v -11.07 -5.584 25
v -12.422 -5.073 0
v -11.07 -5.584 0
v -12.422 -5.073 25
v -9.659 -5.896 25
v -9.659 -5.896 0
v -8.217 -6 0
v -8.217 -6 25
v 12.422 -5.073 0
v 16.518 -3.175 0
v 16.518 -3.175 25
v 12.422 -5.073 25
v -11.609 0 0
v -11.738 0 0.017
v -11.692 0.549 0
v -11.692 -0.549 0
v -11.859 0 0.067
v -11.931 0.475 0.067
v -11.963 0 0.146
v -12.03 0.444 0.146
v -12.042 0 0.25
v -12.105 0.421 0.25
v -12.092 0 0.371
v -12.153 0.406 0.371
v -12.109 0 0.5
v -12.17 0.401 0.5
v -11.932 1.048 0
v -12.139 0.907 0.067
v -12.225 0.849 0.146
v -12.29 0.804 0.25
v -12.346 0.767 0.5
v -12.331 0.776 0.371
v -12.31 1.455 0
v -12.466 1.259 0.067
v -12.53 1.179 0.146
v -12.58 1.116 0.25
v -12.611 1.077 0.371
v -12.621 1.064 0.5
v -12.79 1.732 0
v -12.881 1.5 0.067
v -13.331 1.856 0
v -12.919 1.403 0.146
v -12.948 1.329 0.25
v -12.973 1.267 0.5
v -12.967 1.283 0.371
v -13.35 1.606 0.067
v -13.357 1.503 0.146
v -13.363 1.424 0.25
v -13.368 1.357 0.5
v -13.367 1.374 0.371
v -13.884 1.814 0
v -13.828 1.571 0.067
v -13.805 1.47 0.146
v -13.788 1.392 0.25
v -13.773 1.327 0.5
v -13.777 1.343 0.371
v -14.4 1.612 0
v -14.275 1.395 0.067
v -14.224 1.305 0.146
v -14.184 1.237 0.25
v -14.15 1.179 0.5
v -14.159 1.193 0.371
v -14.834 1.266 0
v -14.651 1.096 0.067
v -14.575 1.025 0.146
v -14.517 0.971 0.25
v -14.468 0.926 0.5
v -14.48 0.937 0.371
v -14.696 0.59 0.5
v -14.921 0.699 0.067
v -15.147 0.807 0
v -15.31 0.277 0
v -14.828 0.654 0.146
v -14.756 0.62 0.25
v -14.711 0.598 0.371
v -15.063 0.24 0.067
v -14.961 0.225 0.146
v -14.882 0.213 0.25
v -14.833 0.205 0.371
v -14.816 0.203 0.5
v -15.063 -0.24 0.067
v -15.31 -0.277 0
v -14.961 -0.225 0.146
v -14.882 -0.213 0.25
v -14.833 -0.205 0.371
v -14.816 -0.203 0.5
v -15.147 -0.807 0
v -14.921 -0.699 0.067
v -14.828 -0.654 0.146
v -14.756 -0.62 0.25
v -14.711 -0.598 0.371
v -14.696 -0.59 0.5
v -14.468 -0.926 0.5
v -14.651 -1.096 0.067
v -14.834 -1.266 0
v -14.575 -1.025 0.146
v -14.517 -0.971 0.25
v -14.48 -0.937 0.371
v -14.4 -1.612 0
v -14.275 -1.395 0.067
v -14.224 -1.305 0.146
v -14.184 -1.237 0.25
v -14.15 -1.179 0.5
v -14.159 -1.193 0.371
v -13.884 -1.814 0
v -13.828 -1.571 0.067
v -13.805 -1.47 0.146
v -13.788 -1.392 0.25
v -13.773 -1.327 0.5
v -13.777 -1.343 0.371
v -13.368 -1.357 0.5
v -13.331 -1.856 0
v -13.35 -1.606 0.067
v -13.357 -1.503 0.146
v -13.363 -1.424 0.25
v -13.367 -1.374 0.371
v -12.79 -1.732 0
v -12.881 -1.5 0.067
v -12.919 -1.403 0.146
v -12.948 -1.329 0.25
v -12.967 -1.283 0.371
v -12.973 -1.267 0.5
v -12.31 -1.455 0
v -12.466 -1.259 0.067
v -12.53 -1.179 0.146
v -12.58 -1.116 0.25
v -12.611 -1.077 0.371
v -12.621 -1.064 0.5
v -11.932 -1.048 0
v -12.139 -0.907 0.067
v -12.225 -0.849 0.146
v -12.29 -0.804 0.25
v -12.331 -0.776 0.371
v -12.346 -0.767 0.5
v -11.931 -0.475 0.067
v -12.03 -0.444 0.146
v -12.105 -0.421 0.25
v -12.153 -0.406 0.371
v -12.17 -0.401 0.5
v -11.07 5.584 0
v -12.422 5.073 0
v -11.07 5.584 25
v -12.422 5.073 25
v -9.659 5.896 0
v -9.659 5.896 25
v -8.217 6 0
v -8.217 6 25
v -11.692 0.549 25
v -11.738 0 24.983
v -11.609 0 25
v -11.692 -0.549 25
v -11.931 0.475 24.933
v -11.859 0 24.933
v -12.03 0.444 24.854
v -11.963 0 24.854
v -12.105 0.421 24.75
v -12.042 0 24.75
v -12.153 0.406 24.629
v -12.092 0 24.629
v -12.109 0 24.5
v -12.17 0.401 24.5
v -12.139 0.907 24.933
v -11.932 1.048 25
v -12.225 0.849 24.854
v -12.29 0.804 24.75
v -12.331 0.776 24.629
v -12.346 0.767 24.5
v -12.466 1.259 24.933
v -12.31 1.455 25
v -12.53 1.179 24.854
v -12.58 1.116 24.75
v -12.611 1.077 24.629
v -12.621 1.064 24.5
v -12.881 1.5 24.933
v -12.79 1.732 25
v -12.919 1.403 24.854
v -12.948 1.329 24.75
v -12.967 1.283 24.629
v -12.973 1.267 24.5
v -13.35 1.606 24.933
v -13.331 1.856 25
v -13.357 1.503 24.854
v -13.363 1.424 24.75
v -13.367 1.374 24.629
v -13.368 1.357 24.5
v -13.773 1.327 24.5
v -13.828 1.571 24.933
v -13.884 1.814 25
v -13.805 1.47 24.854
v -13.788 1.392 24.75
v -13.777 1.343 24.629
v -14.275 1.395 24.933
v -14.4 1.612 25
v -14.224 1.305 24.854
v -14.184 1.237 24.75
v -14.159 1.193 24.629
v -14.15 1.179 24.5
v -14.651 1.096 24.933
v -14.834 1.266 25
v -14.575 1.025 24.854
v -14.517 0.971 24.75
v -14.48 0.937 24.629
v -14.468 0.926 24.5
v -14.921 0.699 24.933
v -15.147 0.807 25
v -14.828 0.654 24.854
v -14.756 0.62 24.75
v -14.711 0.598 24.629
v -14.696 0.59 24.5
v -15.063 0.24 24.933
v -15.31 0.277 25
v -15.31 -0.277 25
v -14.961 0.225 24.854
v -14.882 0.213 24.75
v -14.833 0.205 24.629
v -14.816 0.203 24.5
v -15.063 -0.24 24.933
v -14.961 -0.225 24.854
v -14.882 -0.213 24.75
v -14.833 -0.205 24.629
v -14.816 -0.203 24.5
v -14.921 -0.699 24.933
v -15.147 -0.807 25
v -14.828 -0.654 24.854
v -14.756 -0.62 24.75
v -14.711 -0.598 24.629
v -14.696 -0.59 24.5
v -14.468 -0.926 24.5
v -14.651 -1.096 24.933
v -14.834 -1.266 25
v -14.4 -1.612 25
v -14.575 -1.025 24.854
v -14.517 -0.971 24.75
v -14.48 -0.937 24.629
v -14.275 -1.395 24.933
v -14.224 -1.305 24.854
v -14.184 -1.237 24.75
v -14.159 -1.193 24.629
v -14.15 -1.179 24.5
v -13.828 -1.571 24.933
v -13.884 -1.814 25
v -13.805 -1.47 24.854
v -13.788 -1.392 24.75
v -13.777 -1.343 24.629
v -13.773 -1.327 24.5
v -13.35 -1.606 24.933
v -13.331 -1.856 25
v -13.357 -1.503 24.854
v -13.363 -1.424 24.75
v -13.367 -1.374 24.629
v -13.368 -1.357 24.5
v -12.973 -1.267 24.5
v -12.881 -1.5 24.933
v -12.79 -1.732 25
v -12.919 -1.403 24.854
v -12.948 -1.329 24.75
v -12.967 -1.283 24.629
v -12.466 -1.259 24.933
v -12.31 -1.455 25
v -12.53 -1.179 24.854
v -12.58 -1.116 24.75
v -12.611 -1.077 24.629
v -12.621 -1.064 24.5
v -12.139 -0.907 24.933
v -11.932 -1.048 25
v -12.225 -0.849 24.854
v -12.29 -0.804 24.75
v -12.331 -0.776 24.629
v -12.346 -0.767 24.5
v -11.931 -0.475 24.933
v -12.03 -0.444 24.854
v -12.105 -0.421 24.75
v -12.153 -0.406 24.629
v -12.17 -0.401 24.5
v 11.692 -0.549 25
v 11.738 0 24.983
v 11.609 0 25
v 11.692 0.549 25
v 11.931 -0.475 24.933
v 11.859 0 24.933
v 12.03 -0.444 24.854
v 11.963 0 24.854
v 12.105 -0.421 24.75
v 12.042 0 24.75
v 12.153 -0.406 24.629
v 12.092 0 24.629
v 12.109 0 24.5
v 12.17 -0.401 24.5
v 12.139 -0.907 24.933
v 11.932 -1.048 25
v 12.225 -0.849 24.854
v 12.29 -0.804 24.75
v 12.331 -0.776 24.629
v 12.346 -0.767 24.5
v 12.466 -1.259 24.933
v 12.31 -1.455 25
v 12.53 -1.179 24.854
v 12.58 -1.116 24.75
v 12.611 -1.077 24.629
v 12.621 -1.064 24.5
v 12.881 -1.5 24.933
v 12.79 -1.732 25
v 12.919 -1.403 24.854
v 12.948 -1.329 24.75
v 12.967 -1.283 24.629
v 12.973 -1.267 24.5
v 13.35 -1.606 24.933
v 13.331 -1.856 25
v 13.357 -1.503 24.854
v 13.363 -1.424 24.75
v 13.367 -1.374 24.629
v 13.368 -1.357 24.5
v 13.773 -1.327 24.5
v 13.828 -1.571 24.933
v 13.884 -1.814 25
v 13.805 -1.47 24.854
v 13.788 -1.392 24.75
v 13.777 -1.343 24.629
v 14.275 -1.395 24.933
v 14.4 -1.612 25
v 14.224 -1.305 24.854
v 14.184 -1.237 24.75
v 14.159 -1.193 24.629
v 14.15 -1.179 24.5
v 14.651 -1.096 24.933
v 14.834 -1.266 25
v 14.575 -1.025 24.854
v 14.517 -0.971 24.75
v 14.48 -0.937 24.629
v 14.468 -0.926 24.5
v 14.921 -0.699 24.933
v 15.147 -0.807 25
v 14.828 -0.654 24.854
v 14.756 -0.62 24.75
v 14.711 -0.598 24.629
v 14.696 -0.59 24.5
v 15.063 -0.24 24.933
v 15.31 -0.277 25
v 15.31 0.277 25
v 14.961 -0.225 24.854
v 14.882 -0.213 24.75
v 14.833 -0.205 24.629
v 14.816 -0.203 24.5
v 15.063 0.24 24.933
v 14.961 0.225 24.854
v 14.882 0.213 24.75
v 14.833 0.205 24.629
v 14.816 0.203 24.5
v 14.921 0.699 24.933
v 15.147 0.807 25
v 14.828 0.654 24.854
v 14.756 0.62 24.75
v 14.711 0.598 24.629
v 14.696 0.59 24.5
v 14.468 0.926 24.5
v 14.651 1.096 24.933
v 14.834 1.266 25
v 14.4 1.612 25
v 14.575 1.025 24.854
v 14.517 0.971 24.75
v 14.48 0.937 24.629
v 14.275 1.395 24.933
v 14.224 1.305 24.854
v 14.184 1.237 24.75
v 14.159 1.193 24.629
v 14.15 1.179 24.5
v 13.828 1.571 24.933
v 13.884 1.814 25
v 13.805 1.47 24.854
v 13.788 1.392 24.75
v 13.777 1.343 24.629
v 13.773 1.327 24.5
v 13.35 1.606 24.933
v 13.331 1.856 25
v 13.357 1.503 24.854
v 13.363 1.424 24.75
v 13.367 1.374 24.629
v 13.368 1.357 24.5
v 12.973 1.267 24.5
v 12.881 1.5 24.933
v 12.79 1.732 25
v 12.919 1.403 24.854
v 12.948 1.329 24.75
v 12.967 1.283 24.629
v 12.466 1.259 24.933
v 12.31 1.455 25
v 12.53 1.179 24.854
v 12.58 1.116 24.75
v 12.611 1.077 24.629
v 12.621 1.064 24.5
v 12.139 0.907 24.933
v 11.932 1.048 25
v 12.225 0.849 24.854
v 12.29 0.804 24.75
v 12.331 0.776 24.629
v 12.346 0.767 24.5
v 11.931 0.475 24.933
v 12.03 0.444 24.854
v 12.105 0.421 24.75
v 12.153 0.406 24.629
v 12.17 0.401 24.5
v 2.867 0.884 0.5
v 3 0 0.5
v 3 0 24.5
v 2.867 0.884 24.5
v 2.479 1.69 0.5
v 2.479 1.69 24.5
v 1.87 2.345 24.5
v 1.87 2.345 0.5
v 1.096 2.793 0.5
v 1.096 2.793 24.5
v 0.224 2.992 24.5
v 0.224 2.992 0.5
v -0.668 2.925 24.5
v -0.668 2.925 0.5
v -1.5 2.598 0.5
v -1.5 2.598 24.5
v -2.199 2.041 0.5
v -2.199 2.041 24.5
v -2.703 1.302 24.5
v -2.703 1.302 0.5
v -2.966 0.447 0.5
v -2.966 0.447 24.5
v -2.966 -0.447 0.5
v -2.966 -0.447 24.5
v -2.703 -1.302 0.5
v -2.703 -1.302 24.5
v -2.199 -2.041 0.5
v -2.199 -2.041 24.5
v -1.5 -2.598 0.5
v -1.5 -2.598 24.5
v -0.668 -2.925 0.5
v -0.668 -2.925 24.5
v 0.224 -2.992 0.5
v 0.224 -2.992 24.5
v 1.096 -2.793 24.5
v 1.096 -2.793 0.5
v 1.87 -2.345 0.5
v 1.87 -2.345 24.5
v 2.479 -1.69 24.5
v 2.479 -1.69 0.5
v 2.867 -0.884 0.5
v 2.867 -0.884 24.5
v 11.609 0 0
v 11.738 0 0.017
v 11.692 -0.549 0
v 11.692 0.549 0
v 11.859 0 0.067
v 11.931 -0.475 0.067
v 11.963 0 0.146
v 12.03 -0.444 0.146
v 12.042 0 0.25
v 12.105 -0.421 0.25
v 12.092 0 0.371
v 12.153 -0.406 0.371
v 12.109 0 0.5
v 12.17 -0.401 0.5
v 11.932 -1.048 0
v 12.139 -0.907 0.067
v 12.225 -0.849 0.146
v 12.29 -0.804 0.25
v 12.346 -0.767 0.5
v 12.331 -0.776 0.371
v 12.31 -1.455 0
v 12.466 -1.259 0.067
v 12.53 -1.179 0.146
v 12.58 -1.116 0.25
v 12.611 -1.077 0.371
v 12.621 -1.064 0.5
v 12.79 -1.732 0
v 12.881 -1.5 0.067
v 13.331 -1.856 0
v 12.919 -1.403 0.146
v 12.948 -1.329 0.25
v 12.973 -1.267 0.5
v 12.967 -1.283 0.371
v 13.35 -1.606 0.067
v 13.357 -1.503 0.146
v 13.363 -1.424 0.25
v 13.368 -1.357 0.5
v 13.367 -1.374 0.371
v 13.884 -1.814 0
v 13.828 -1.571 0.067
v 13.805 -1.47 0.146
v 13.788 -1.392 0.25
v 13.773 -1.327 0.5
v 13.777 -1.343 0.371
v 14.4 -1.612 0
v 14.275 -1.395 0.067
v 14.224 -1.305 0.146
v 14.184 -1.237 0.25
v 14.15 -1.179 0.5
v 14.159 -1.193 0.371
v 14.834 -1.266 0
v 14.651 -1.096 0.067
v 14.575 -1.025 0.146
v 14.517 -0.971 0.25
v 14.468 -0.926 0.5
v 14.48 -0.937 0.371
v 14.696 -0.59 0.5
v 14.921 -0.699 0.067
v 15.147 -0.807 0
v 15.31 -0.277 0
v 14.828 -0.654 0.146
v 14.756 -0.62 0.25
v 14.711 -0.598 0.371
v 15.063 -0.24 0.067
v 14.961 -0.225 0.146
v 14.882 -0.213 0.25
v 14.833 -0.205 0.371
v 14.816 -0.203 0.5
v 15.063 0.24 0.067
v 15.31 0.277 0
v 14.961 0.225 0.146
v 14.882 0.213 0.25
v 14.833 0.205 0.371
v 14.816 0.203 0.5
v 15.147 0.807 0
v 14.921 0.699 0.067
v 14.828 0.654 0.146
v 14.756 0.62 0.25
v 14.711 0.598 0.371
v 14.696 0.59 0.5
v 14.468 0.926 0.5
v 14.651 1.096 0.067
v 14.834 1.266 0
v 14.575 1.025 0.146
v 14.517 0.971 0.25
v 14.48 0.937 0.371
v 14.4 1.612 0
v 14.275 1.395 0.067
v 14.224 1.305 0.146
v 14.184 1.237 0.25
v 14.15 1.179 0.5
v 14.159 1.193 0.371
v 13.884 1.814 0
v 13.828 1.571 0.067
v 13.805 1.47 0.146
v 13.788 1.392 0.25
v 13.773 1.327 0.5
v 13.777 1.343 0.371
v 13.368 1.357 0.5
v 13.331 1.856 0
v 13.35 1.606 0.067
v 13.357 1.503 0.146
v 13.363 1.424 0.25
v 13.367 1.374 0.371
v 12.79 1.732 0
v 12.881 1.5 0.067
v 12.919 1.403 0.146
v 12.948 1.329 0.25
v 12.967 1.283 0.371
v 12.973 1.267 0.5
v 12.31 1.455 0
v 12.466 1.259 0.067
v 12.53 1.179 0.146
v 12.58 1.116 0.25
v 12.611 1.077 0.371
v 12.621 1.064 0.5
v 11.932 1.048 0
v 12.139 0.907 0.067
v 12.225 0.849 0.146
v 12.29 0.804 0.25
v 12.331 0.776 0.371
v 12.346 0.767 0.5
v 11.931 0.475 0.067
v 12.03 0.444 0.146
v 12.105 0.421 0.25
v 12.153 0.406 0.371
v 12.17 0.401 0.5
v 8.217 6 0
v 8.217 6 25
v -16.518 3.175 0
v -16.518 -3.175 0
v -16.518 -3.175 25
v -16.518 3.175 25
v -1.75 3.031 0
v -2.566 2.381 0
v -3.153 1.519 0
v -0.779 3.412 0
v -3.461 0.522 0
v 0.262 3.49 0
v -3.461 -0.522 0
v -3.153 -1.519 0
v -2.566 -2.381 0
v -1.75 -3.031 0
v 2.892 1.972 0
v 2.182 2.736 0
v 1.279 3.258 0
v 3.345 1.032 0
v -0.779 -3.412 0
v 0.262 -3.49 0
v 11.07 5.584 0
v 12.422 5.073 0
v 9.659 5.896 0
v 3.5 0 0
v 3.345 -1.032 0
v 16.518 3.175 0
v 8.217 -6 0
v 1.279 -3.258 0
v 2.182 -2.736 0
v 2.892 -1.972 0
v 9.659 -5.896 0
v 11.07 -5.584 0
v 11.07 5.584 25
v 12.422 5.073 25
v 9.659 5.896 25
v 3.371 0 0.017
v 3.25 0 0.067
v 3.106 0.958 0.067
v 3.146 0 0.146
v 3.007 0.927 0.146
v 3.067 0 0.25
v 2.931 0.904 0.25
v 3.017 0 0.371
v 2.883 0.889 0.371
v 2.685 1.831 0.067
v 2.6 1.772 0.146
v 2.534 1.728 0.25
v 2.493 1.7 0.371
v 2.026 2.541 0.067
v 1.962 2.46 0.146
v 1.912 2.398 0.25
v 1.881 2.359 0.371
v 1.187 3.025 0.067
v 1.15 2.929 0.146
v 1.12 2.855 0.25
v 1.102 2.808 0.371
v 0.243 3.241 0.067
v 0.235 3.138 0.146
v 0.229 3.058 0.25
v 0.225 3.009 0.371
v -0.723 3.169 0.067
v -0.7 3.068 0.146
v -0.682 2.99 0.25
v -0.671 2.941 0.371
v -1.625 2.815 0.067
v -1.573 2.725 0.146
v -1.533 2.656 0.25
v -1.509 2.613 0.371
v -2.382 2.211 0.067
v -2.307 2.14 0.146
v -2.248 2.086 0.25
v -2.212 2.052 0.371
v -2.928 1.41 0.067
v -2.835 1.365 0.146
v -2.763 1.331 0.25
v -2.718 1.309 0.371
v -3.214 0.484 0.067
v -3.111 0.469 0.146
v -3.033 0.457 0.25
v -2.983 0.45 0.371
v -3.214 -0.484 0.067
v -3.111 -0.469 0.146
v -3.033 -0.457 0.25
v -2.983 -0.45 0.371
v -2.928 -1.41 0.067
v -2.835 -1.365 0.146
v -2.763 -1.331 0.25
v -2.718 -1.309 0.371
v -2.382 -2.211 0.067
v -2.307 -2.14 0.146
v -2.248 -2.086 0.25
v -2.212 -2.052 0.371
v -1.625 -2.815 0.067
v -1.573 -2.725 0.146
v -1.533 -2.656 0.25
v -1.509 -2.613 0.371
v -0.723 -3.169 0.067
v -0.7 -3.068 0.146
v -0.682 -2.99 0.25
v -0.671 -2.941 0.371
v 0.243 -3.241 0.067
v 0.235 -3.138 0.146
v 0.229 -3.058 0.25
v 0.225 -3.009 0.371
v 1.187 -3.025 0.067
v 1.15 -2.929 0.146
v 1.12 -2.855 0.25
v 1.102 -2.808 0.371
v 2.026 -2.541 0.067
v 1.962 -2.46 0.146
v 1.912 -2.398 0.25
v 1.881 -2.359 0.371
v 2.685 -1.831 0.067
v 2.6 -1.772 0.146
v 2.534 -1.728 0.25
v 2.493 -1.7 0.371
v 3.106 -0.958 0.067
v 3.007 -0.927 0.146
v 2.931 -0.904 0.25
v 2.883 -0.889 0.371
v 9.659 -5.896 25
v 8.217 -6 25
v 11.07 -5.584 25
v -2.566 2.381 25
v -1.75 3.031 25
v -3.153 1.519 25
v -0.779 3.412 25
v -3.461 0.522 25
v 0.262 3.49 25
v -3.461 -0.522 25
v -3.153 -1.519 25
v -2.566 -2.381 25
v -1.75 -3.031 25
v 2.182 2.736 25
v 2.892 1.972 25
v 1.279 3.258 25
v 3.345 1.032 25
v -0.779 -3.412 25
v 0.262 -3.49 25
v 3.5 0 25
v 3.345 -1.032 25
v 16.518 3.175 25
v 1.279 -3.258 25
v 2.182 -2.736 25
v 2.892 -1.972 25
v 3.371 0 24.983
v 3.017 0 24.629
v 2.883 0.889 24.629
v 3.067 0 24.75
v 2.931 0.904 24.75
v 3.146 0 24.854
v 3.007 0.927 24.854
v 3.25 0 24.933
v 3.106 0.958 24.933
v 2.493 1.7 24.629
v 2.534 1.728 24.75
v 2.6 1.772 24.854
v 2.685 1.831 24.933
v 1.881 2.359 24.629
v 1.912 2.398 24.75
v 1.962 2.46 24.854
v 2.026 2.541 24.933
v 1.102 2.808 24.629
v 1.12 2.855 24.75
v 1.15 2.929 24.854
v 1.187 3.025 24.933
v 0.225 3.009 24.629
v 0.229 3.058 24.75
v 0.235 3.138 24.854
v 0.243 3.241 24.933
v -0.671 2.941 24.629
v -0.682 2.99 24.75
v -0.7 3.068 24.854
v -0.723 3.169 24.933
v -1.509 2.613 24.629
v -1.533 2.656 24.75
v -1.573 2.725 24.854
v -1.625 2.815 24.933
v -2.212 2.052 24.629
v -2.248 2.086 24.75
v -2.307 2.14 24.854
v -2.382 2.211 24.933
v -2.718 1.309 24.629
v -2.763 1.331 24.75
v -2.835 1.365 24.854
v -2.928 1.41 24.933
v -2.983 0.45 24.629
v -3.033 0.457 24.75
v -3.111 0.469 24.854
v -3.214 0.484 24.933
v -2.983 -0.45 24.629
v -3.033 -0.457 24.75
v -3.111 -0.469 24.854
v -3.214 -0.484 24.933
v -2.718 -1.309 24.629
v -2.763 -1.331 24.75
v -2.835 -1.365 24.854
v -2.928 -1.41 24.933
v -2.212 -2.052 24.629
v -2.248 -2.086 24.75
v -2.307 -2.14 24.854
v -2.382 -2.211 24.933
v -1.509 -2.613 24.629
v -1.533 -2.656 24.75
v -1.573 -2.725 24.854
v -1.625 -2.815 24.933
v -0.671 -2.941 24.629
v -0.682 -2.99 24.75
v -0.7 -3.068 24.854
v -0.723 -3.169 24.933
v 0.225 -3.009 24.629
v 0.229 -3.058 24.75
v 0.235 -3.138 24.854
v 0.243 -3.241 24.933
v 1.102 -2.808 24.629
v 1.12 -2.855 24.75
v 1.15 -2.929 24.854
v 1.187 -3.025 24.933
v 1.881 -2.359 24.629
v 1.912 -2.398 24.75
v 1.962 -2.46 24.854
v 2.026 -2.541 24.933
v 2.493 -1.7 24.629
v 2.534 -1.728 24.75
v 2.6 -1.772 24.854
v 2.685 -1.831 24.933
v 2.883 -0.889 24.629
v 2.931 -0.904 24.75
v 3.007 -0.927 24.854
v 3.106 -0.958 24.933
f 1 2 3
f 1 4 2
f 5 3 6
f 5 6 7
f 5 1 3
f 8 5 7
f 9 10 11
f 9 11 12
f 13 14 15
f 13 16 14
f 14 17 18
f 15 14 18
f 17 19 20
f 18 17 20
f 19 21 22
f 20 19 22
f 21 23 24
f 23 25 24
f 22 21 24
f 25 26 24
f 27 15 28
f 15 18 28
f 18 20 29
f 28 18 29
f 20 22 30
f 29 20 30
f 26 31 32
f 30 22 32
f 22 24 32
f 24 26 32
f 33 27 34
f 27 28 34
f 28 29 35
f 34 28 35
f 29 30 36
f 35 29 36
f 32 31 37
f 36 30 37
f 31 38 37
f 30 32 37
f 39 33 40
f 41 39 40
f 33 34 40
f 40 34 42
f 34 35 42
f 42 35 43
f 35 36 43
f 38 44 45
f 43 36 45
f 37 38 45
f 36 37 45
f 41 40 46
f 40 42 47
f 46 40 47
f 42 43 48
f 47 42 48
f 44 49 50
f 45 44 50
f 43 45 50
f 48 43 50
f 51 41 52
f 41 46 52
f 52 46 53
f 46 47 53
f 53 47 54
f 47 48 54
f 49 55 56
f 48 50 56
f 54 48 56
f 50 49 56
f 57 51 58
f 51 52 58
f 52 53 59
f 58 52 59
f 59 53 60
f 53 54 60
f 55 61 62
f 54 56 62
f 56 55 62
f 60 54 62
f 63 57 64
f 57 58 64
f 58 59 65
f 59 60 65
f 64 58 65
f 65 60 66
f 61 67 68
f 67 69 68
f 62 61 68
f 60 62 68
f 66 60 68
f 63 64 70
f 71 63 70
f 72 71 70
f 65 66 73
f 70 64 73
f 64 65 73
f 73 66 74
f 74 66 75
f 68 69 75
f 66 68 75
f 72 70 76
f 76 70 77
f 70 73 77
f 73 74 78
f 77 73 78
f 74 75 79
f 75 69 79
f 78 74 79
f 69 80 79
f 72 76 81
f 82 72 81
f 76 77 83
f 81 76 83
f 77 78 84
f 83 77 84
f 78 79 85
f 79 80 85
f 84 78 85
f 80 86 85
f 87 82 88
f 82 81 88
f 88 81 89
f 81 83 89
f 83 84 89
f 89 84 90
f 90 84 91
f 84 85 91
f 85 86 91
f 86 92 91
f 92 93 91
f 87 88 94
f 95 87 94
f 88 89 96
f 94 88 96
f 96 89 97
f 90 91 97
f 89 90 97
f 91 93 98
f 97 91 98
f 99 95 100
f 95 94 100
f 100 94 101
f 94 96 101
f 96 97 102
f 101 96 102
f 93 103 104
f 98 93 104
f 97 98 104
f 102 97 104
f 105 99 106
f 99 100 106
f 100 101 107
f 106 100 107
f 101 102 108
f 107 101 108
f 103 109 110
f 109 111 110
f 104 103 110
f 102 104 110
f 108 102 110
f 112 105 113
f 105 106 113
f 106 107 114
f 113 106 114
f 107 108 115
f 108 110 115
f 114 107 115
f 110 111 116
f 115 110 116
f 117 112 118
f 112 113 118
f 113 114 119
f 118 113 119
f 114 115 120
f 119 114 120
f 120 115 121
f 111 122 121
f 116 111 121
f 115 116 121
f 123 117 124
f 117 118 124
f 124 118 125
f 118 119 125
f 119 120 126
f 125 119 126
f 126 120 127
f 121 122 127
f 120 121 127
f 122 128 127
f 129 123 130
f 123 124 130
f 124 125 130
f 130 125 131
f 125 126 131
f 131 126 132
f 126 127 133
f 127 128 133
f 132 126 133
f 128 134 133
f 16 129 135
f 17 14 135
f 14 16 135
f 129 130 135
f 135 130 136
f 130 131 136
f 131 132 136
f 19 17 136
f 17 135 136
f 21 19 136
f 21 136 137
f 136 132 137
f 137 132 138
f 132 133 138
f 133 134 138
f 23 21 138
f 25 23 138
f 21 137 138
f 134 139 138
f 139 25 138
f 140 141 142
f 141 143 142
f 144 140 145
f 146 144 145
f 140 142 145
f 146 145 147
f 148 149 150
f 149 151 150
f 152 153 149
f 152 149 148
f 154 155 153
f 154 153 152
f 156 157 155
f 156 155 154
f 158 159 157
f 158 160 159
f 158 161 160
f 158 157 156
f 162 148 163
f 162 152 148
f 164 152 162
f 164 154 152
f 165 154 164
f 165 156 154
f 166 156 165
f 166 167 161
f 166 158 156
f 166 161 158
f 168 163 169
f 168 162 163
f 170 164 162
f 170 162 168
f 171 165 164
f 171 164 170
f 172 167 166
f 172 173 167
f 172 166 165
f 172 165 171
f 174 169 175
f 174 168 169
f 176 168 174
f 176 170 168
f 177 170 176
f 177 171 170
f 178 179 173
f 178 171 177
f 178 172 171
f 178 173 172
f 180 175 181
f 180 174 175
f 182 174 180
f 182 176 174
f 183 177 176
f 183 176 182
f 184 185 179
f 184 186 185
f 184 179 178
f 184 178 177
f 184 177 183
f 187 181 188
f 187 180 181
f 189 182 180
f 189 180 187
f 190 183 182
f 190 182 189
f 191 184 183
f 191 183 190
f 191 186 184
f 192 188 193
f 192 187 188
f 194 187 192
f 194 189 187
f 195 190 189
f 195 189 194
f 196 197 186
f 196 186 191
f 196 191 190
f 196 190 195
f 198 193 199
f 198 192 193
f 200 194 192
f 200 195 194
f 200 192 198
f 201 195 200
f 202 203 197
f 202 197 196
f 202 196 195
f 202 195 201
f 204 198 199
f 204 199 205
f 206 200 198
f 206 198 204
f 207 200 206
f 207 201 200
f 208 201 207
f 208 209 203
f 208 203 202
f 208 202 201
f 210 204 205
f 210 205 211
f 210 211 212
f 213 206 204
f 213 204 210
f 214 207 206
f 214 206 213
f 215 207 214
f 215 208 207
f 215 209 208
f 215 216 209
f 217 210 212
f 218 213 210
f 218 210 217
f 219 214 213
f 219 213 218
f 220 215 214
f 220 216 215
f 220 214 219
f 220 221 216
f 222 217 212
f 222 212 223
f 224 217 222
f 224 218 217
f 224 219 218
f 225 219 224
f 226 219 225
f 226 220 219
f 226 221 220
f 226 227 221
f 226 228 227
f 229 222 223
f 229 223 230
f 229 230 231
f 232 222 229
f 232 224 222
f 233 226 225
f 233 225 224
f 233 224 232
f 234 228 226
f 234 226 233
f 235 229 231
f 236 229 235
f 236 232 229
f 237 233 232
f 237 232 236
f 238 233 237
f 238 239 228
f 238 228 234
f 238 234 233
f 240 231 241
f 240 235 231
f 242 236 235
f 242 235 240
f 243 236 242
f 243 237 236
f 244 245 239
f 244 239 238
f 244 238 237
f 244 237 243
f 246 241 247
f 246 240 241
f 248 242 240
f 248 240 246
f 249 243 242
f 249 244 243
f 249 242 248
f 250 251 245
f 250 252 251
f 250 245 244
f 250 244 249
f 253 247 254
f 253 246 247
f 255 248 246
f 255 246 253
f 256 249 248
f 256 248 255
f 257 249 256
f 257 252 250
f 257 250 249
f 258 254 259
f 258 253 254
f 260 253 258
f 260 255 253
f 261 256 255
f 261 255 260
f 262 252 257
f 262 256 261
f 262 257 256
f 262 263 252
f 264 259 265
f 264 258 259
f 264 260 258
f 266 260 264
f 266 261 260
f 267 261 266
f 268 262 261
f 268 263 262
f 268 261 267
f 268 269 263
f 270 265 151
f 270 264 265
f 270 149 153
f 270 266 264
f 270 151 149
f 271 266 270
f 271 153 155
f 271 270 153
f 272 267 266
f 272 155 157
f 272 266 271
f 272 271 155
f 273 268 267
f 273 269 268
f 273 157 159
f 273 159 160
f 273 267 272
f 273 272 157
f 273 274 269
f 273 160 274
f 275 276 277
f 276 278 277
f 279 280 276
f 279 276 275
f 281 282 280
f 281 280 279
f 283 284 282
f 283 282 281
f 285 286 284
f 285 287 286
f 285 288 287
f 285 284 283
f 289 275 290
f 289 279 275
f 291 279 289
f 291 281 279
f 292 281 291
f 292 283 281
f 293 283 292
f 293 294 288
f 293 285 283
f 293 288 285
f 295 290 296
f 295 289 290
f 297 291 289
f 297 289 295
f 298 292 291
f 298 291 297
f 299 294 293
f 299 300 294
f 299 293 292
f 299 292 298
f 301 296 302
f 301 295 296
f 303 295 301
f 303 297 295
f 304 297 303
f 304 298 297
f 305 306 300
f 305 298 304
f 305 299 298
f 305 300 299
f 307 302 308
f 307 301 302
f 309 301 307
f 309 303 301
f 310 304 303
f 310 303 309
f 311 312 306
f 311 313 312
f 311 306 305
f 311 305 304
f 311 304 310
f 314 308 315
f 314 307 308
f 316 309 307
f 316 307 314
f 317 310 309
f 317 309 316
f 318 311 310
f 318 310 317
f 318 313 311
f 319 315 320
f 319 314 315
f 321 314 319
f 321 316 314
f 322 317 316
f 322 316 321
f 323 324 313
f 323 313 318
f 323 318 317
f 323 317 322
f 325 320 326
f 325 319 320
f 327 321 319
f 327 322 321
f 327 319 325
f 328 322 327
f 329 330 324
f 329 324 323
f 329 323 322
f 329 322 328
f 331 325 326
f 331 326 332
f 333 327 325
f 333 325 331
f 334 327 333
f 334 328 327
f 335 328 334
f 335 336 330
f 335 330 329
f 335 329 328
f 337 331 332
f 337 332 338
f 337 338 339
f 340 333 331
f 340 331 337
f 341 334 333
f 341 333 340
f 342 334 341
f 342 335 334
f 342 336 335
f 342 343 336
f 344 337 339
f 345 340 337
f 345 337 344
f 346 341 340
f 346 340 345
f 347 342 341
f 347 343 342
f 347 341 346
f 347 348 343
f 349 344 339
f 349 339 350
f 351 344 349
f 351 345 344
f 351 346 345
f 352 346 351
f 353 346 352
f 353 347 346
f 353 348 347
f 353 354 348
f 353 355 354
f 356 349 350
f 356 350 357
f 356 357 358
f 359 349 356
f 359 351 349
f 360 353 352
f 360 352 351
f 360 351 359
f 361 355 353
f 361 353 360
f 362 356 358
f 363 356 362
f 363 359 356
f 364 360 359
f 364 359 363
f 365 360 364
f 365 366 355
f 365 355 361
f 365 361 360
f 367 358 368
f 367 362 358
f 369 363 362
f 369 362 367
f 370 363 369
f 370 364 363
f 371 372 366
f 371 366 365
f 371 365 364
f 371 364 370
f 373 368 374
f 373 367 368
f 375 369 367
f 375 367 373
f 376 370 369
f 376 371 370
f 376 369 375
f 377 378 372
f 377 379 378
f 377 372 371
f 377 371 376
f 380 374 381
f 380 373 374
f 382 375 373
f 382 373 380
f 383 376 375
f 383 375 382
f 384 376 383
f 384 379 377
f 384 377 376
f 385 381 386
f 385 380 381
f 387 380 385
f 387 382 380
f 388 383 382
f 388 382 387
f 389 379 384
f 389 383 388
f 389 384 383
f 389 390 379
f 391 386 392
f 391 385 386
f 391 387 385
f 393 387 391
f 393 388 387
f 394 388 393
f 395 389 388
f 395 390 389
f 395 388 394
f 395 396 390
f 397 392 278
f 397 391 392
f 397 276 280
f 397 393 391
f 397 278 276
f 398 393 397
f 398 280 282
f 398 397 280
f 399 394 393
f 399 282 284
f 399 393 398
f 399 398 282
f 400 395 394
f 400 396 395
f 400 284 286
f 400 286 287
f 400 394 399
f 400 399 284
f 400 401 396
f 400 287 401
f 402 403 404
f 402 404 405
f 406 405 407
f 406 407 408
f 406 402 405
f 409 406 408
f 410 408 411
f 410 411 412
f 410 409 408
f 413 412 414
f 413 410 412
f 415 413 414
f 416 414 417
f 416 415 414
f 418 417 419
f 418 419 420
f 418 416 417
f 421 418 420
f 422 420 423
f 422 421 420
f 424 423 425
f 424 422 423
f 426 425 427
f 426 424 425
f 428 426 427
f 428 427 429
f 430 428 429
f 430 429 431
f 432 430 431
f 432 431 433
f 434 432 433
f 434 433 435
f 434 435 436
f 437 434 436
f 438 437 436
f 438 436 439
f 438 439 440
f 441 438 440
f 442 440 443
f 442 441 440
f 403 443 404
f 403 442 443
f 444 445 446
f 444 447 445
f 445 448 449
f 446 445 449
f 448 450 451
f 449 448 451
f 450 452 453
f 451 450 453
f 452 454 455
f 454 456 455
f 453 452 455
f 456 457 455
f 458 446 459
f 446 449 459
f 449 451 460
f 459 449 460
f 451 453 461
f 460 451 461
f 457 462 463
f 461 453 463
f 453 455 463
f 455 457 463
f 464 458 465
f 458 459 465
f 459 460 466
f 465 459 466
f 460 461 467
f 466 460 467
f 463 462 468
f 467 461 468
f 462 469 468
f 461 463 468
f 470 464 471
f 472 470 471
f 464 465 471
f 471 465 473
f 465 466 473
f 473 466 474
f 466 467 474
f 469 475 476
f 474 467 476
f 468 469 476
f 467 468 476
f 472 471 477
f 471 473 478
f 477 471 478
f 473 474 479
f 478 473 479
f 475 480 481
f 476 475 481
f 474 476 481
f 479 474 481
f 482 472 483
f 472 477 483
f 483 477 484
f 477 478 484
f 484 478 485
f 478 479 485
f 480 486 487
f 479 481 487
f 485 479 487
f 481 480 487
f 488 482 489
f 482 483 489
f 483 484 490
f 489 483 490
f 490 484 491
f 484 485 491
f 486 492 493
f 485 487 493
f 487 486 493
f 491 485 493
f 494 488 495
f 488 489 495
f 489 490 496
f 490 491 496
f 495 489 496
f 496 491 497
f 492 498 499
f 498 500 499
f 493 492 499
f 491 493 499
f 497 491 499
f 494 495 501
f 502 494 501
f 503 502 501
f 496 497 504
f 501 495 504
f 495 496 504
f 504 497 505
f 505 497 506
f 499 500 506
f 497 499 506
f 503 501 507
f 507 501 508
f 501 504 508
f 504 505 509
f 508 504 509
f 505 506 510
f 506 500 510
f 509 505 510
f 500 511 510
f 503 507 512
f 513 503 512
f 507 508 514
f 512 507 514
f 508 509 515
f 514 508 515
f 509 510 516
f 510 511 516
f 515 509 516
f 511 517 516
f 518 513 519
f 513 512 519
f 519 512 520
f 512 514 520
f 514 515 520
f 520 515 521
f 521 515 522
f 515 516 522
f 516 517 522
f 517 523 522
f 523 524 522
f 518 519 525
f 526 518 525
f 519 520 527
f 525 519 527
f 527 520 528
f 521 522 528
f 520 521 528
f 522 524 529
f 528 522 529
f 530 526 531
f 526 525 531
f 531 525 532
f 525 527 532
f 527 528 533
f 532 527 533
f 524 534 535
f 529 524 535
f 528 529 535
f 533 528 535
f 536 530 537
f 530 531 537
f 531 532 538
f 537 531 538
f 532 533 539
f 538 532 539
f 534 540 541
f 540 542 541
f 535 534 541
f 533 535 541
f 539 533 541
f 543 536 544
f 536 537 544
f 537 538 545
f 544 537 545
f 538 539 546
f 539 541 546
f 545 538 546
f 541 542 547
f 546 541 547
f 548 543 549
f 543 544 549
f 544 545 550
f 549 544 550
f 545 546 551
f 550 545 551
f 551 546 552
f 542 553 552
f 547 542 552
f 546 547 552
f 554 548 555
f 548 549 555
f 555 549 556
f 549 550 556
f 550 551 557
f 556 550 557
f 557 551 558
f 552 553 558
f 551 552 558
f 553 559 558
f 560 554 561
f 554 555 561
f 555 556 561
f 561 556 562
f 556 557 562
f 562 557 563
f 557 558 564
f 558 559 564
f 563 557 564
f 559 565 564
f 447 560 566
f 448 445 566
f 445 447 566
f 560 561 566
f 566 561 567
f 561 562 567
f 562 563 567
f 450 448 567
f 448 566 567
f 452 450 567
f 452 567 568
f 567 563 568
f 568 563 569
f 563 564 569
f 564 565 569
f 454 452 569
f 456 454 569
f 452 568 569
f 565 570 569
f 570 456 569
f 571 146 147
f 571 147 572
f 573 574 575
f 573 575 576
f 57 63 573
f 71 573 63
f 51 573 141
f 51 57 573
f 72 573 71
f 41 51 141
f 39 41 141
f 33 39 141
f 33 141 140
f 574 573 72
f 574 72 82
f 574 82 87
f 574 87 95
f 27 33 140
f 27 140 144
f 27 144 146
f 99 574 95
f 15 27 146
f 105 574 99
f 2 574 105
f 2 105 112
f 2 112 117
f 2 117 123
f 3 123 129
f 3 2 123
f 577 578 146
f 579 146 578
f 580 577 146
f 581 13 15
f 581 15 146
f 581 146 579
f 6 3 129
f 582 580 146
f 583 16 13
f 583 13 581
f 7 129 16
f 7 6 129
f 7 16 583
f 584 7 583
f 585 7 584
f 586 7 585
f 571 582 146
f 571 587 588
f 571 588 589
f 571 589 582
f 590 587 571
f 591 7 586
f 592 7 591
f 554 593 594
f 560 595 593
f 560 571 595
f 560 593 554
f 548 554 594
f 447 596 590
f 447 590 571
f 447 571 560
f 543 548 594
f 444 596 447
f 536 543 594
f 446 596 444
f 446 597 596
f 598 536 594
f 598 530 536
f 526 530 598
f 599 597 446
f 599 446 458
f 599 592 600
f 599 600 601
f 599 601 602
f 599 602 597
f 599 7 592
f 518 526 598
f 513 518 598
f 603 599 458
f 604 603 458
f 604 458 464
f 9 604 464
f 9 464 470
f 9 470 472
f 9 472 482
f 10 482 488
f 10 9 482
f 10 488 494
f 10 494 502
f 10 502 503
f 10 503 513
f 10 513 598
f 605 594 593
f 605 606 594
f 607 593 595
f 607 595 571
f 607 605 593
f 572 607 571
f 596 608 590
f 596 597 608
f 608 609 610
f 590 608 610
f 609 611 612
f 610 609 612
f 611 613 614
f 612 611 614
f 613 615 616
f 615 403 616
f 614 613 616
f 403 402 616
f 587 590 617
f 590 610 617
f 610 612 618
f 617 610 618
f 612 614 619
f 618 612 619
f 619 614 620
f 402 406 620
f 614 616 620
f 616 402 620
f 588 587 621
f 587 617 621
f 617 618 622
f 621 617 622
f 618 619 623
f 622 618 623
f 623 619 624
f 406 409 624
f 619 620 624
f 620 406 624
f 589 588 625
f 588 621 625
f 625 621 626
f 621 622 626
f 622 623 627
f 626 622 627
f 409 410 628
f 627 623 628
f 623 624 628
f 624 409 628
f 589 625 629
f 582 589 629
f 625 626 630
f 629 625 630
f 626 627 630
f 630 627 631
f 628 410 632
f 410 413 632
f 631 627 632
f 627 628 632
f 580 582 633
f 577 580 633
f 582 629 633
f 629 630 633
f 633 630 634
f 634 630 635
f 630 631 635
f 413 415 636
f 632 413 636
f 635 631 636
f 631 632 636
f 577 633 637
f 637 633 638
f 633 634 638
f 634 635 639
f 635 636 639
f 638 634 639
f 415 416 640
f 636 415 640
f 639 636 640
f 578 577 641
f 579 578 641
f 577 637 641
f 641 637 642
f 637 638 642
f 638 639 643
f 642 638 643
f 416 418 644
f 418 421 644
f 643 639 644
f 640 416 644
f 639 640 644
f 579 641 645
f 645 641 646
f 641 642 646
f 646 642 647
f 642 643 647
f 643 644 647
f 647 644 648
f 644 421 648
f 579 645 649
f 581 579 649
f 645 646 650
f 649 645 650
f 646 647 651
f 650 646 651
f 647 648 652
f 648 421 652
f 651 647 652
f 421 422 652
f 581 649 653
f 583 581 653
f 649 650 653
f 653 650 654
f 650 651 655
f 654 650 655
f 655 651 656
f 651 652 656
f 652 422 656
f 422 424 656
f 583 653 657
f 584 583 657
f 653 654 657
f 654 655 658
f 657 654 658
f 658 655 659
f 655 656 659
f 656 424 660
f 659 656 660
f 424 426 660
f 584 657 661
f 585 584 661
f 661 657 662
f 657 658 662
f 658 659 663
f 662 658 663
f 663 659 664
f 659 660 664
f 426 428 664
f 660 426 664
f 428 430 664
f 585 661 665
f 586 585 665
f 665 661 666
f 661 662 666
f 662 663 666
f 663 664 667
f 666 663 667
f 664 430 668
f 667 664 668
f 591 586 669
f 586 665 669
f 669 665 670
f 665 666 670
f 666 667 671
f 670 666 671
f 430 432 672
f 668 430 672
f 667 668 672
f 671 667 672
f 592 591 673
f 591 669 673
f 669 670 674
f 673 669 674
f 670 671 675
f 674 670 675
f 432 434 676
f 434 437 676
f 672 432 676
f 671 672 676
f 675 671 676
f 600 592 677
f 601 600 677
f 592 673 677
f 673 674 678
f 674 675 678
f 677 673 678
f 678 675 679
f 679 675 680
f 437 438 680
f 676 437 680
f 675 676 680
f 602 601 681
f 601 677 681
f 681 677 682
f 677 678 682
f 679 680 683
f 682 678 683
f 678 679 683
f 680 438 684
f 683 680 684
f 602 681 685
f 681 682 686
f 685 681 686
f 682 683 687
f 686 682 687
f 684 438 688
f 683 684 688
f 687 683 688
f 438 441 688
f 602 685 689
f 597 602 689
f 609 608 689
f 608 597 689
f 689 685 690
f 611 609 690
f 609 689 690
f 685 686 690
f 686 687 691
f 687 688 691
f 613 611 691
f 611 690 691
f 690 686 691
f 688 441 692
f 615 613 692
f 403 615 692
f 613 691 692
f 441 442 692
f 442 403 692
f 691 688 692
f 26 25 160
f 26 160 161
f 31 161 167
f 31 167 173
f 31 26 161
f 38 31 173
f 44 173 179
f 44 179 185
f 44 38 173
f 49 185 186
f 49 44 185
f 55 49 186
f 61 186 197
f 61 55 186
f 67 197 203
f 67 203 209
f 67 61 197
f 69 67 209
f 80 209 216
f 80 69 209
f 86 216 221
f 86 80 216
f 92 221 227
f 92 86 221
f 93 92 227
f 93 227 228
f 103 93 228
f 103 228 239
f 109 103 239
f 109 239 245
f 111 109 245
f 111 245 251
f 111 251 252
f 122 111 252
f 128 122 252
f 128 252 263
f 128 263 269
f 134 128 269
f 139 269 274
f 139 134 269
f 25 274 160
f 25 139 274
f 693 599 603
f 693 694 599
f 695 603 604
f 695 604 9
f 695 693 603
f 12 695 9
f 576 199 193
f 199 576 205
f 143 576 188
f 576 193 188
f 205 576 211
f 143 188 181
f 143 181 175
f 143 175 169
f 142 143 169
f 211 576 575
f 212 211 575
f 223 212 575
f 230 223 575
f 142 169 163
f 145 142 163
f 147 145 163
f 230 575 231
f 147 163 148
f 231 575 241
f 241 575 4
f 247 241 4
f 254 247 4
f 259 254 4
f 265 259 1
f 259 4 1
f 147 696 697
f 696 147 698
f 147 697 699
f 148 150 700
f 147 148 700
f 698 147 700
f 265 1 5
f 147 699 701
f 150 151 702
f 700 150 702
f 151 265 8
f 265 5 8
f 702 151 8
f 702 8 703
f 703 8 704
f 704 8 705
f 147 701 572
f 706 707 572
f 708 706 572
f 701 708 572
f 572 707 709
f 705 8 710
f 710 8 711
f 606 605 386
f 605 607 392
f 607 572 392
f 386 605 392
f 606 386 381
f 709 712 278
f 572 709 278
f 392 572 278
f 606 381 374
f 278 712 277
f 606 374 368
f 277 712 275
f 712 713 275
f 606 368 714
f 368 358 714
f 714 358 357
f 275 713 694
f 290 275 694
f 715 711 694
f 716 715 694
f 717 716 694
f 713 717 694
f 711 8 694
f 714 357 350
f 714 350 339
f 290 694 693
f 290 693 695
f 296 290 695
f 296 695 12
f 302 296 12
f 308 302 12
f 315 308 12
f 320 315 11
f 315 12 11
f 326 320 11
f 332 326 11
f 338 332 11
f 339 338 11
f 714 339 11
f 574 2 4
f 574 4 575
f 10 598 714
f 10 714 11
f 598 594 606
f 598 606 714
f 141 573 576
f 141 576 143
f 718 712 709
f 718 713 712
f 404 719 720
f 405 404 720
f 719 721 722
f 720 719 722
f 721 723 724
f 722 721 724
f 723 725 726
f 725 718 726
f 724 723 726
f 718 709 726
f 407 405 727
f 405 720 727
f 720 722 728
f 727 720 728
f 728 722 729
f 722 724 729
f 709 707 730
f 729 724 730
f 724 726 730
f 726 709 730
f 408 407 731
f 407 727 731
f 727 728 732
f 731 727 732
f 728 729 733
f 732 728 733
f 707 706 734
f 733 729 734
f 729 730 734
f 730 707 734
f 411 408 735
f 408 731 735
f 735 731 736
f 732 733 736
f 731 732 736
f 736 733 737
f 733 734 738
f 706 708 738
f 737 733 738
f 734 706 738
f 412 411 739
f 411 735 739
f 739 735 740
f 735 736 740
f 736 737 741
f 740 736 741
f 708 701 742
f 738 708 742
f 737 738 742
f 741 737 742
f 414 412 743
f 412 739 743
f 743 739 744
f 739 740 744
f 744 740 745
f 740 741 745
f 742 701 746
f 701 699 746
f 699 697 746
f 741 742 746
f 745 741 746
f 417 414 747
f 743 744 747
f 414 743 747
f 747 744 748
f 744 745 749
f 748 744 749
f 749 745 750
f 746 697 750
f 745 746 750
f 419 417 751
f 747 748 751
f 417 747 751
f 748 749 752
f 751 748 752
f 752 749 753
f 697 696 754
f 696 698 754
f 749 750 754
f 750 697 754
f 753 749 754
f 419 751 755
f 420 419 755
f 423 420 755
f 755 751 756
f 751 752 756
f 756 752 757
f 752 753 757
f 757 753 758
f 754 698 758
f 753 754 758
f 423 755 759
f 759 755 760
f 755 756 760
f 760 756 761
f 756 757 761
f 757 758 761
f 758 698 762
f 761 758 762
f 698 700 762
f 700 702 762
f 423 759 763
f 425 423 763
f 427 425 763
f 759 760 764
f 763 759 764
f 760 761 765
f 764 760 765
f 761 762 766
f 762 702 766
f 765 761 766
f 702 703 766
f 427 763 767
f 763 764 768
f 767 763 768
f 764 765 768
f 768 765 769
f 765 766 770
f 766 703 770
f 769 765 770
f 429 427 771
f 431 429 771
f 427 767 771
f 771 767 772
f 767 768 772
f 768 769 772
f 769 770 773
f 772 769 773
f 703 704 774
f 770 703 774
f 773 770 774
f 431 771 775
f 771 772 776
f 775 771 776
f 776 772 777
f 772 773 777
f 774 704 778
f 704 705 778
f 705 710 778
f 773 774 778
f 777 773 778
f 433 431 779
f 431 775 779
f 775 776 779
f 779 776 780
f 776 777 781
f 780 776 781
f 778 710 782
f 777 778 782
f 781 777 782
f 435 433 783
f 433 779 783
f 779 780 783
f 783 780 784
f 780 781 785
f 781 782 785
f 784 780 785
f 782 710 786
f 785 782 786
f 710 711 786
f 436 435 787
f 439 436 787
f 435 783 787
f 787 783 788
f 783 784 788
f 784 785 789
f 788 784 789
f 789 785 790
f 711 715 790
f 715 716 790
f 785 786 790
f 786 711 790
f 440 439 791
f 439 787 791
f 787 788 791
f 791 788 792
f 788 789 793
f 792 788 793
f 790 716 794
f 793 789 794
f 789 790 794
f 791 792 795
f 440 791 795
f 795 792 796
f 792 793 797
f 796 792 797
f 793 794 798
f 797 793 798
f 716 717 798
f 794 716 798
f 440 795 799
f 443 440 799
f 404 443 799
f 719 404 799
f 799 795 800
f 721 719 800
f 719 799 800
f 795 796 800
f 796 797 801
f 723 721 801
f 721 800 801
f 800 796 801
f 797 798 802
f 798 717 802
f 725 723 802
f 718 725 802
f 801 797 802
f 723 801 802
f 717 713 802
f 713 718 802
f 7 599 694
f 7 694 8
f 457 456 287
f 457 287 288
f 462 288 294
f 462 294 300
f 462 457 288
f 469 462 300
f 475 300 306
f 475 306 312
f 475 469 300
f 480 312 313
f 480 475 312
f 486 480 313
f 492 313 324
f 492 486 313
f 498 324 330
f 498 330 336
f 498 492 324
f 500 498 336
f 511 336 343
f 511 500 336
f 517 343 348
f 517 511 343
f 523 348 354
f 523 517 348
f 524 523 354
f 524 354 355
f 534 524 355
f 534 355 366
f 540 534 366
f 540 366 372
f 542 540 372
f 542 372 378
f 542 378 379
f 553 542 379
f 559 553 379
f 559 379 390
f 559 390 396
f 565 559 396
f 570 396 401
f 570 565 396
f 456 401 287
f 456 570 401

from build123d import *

# Parameters (mm, degrees)
SKETCH1_R           = 1.360934182
SKETCH1_R_2         = 3
BOSS_EXTRUDE1_DEPTH = 25
FILLET1_R           = 10
FILLET2_R           = 10
FILLET4_R           = 10
FILLET5_R           = 10
FILLET8_R           = 0.5
FILLET9_R           = 0.5
FILLET10_R          = 0.5
FILLET11_R          = 0.5
FILLET12_R          = 0.5
FILLET13_R          = 0.5


with BuildPart() as part:
    # Sketch1 → Boss-Extrude1 (new body)
    with BuildSketch(Plane(origin=(0, 0, 0), x_dir=(-1, 0, 0), z_dir=(0, 0, 1))):
        Polygon((16.51797461, 3.175), (16.51797461, -3.175), (10.42197461, -6), (-10.42197461, -6), (-16.51797461, -3.175), (-16.51797461, 3.175), (-10.42197461, 6), (10.42197461, 6), align=None)
        with Locations(Location((13.46997461, 0, 0), (0, 0, 180))):
            Circle(SKETCH1_R, mode=Mode.SUBTRACT)
        with Locations((-13.46997461, 0)):
            Circle(SKETCH1_R, mode=Mode.SUBTRACT)
        with Locations(Location((0, 0, 0), (0, 0, 180))):
            Circle(SKETCH1_R_2, mode=Mode.SUBTRACT)
    extrude(amount=BOSS_EXTRUDE1_DEPTH)

    # Fillet1
    fillet1_edges = [part.edges().sort_by_distance(p)[0] for p in [
        (-10.42197461, 6, 12.5),
    ]]
    fillet(fillet1_edges, radius=FILLET1_R)

    # Fillet2
    fillet2_edges = [part.edges().sort_by_distance(p)[0] for p in [
        (-10.42197461, -6, 12.5),
    ]]
    fillet(fillet2_edges, radius=FILLET2_R)

    # Fillet4
    fillet4_edges = [part.edges().sort_by_distance(p)[0] for p in [
        (10.42197461, -6, 12.5),
    ]]
    fillet(fillet4_edges, radius=FILLET4_R)

    # Fillet5
    fillet5_edges = [part.edges().sort_by_distance(p)[0] for p in [
        (10.42197461, 6, 12.5),
    ]]
    fillet(fillet5_edges, radius=FILLET5_R)

    # Fillet8
    fillet8_edges = [part.edges().sort_by_distance(p)[0] for p in [
        (-3, 0, 0),
    ]]
    fillet(fillet8_edges, radius=FILLET8_R)

    # Fillet9
    fillet9_edges = [part.edges().sort_by_distance(p)[0] for p in [
        (14.830908792, 0, 0),
    ]]
    fillet(fillet9_edges, radius=FILLET9_R)

    # Fillet10
    fillet10_edges = [part.edges().sort_by_distance(p)[0] for p in [
        (-14.830908792, 0, 0),
    ]]
    fillet(fillet10_edges, radius=FILLET10_R)

    # Fillet11
    fillet11_edges = [part.edges().sort_by_distance(p)[0] for p in [
        (-3, 0, 25),
    ]]
    fillet(fillet11_edges, radius=FILLET11_R)

    # Fillet12
    fillet12_edges = [part.edges().sort_by_distance(p)[0] for p in [
        (14.830908792, 0, 25),
    ]]
    fillet(fillet12_edges, radius=FILLET12_R)

    # Fillet13
    fillet13_edges = [part.edges().sort_by_distance(p)[0] for p in [
        (-14.830908792, 0, 25),
    ]]
    fillet(fillet13_edges, radius=FILLET13_R)


solid = part.part
